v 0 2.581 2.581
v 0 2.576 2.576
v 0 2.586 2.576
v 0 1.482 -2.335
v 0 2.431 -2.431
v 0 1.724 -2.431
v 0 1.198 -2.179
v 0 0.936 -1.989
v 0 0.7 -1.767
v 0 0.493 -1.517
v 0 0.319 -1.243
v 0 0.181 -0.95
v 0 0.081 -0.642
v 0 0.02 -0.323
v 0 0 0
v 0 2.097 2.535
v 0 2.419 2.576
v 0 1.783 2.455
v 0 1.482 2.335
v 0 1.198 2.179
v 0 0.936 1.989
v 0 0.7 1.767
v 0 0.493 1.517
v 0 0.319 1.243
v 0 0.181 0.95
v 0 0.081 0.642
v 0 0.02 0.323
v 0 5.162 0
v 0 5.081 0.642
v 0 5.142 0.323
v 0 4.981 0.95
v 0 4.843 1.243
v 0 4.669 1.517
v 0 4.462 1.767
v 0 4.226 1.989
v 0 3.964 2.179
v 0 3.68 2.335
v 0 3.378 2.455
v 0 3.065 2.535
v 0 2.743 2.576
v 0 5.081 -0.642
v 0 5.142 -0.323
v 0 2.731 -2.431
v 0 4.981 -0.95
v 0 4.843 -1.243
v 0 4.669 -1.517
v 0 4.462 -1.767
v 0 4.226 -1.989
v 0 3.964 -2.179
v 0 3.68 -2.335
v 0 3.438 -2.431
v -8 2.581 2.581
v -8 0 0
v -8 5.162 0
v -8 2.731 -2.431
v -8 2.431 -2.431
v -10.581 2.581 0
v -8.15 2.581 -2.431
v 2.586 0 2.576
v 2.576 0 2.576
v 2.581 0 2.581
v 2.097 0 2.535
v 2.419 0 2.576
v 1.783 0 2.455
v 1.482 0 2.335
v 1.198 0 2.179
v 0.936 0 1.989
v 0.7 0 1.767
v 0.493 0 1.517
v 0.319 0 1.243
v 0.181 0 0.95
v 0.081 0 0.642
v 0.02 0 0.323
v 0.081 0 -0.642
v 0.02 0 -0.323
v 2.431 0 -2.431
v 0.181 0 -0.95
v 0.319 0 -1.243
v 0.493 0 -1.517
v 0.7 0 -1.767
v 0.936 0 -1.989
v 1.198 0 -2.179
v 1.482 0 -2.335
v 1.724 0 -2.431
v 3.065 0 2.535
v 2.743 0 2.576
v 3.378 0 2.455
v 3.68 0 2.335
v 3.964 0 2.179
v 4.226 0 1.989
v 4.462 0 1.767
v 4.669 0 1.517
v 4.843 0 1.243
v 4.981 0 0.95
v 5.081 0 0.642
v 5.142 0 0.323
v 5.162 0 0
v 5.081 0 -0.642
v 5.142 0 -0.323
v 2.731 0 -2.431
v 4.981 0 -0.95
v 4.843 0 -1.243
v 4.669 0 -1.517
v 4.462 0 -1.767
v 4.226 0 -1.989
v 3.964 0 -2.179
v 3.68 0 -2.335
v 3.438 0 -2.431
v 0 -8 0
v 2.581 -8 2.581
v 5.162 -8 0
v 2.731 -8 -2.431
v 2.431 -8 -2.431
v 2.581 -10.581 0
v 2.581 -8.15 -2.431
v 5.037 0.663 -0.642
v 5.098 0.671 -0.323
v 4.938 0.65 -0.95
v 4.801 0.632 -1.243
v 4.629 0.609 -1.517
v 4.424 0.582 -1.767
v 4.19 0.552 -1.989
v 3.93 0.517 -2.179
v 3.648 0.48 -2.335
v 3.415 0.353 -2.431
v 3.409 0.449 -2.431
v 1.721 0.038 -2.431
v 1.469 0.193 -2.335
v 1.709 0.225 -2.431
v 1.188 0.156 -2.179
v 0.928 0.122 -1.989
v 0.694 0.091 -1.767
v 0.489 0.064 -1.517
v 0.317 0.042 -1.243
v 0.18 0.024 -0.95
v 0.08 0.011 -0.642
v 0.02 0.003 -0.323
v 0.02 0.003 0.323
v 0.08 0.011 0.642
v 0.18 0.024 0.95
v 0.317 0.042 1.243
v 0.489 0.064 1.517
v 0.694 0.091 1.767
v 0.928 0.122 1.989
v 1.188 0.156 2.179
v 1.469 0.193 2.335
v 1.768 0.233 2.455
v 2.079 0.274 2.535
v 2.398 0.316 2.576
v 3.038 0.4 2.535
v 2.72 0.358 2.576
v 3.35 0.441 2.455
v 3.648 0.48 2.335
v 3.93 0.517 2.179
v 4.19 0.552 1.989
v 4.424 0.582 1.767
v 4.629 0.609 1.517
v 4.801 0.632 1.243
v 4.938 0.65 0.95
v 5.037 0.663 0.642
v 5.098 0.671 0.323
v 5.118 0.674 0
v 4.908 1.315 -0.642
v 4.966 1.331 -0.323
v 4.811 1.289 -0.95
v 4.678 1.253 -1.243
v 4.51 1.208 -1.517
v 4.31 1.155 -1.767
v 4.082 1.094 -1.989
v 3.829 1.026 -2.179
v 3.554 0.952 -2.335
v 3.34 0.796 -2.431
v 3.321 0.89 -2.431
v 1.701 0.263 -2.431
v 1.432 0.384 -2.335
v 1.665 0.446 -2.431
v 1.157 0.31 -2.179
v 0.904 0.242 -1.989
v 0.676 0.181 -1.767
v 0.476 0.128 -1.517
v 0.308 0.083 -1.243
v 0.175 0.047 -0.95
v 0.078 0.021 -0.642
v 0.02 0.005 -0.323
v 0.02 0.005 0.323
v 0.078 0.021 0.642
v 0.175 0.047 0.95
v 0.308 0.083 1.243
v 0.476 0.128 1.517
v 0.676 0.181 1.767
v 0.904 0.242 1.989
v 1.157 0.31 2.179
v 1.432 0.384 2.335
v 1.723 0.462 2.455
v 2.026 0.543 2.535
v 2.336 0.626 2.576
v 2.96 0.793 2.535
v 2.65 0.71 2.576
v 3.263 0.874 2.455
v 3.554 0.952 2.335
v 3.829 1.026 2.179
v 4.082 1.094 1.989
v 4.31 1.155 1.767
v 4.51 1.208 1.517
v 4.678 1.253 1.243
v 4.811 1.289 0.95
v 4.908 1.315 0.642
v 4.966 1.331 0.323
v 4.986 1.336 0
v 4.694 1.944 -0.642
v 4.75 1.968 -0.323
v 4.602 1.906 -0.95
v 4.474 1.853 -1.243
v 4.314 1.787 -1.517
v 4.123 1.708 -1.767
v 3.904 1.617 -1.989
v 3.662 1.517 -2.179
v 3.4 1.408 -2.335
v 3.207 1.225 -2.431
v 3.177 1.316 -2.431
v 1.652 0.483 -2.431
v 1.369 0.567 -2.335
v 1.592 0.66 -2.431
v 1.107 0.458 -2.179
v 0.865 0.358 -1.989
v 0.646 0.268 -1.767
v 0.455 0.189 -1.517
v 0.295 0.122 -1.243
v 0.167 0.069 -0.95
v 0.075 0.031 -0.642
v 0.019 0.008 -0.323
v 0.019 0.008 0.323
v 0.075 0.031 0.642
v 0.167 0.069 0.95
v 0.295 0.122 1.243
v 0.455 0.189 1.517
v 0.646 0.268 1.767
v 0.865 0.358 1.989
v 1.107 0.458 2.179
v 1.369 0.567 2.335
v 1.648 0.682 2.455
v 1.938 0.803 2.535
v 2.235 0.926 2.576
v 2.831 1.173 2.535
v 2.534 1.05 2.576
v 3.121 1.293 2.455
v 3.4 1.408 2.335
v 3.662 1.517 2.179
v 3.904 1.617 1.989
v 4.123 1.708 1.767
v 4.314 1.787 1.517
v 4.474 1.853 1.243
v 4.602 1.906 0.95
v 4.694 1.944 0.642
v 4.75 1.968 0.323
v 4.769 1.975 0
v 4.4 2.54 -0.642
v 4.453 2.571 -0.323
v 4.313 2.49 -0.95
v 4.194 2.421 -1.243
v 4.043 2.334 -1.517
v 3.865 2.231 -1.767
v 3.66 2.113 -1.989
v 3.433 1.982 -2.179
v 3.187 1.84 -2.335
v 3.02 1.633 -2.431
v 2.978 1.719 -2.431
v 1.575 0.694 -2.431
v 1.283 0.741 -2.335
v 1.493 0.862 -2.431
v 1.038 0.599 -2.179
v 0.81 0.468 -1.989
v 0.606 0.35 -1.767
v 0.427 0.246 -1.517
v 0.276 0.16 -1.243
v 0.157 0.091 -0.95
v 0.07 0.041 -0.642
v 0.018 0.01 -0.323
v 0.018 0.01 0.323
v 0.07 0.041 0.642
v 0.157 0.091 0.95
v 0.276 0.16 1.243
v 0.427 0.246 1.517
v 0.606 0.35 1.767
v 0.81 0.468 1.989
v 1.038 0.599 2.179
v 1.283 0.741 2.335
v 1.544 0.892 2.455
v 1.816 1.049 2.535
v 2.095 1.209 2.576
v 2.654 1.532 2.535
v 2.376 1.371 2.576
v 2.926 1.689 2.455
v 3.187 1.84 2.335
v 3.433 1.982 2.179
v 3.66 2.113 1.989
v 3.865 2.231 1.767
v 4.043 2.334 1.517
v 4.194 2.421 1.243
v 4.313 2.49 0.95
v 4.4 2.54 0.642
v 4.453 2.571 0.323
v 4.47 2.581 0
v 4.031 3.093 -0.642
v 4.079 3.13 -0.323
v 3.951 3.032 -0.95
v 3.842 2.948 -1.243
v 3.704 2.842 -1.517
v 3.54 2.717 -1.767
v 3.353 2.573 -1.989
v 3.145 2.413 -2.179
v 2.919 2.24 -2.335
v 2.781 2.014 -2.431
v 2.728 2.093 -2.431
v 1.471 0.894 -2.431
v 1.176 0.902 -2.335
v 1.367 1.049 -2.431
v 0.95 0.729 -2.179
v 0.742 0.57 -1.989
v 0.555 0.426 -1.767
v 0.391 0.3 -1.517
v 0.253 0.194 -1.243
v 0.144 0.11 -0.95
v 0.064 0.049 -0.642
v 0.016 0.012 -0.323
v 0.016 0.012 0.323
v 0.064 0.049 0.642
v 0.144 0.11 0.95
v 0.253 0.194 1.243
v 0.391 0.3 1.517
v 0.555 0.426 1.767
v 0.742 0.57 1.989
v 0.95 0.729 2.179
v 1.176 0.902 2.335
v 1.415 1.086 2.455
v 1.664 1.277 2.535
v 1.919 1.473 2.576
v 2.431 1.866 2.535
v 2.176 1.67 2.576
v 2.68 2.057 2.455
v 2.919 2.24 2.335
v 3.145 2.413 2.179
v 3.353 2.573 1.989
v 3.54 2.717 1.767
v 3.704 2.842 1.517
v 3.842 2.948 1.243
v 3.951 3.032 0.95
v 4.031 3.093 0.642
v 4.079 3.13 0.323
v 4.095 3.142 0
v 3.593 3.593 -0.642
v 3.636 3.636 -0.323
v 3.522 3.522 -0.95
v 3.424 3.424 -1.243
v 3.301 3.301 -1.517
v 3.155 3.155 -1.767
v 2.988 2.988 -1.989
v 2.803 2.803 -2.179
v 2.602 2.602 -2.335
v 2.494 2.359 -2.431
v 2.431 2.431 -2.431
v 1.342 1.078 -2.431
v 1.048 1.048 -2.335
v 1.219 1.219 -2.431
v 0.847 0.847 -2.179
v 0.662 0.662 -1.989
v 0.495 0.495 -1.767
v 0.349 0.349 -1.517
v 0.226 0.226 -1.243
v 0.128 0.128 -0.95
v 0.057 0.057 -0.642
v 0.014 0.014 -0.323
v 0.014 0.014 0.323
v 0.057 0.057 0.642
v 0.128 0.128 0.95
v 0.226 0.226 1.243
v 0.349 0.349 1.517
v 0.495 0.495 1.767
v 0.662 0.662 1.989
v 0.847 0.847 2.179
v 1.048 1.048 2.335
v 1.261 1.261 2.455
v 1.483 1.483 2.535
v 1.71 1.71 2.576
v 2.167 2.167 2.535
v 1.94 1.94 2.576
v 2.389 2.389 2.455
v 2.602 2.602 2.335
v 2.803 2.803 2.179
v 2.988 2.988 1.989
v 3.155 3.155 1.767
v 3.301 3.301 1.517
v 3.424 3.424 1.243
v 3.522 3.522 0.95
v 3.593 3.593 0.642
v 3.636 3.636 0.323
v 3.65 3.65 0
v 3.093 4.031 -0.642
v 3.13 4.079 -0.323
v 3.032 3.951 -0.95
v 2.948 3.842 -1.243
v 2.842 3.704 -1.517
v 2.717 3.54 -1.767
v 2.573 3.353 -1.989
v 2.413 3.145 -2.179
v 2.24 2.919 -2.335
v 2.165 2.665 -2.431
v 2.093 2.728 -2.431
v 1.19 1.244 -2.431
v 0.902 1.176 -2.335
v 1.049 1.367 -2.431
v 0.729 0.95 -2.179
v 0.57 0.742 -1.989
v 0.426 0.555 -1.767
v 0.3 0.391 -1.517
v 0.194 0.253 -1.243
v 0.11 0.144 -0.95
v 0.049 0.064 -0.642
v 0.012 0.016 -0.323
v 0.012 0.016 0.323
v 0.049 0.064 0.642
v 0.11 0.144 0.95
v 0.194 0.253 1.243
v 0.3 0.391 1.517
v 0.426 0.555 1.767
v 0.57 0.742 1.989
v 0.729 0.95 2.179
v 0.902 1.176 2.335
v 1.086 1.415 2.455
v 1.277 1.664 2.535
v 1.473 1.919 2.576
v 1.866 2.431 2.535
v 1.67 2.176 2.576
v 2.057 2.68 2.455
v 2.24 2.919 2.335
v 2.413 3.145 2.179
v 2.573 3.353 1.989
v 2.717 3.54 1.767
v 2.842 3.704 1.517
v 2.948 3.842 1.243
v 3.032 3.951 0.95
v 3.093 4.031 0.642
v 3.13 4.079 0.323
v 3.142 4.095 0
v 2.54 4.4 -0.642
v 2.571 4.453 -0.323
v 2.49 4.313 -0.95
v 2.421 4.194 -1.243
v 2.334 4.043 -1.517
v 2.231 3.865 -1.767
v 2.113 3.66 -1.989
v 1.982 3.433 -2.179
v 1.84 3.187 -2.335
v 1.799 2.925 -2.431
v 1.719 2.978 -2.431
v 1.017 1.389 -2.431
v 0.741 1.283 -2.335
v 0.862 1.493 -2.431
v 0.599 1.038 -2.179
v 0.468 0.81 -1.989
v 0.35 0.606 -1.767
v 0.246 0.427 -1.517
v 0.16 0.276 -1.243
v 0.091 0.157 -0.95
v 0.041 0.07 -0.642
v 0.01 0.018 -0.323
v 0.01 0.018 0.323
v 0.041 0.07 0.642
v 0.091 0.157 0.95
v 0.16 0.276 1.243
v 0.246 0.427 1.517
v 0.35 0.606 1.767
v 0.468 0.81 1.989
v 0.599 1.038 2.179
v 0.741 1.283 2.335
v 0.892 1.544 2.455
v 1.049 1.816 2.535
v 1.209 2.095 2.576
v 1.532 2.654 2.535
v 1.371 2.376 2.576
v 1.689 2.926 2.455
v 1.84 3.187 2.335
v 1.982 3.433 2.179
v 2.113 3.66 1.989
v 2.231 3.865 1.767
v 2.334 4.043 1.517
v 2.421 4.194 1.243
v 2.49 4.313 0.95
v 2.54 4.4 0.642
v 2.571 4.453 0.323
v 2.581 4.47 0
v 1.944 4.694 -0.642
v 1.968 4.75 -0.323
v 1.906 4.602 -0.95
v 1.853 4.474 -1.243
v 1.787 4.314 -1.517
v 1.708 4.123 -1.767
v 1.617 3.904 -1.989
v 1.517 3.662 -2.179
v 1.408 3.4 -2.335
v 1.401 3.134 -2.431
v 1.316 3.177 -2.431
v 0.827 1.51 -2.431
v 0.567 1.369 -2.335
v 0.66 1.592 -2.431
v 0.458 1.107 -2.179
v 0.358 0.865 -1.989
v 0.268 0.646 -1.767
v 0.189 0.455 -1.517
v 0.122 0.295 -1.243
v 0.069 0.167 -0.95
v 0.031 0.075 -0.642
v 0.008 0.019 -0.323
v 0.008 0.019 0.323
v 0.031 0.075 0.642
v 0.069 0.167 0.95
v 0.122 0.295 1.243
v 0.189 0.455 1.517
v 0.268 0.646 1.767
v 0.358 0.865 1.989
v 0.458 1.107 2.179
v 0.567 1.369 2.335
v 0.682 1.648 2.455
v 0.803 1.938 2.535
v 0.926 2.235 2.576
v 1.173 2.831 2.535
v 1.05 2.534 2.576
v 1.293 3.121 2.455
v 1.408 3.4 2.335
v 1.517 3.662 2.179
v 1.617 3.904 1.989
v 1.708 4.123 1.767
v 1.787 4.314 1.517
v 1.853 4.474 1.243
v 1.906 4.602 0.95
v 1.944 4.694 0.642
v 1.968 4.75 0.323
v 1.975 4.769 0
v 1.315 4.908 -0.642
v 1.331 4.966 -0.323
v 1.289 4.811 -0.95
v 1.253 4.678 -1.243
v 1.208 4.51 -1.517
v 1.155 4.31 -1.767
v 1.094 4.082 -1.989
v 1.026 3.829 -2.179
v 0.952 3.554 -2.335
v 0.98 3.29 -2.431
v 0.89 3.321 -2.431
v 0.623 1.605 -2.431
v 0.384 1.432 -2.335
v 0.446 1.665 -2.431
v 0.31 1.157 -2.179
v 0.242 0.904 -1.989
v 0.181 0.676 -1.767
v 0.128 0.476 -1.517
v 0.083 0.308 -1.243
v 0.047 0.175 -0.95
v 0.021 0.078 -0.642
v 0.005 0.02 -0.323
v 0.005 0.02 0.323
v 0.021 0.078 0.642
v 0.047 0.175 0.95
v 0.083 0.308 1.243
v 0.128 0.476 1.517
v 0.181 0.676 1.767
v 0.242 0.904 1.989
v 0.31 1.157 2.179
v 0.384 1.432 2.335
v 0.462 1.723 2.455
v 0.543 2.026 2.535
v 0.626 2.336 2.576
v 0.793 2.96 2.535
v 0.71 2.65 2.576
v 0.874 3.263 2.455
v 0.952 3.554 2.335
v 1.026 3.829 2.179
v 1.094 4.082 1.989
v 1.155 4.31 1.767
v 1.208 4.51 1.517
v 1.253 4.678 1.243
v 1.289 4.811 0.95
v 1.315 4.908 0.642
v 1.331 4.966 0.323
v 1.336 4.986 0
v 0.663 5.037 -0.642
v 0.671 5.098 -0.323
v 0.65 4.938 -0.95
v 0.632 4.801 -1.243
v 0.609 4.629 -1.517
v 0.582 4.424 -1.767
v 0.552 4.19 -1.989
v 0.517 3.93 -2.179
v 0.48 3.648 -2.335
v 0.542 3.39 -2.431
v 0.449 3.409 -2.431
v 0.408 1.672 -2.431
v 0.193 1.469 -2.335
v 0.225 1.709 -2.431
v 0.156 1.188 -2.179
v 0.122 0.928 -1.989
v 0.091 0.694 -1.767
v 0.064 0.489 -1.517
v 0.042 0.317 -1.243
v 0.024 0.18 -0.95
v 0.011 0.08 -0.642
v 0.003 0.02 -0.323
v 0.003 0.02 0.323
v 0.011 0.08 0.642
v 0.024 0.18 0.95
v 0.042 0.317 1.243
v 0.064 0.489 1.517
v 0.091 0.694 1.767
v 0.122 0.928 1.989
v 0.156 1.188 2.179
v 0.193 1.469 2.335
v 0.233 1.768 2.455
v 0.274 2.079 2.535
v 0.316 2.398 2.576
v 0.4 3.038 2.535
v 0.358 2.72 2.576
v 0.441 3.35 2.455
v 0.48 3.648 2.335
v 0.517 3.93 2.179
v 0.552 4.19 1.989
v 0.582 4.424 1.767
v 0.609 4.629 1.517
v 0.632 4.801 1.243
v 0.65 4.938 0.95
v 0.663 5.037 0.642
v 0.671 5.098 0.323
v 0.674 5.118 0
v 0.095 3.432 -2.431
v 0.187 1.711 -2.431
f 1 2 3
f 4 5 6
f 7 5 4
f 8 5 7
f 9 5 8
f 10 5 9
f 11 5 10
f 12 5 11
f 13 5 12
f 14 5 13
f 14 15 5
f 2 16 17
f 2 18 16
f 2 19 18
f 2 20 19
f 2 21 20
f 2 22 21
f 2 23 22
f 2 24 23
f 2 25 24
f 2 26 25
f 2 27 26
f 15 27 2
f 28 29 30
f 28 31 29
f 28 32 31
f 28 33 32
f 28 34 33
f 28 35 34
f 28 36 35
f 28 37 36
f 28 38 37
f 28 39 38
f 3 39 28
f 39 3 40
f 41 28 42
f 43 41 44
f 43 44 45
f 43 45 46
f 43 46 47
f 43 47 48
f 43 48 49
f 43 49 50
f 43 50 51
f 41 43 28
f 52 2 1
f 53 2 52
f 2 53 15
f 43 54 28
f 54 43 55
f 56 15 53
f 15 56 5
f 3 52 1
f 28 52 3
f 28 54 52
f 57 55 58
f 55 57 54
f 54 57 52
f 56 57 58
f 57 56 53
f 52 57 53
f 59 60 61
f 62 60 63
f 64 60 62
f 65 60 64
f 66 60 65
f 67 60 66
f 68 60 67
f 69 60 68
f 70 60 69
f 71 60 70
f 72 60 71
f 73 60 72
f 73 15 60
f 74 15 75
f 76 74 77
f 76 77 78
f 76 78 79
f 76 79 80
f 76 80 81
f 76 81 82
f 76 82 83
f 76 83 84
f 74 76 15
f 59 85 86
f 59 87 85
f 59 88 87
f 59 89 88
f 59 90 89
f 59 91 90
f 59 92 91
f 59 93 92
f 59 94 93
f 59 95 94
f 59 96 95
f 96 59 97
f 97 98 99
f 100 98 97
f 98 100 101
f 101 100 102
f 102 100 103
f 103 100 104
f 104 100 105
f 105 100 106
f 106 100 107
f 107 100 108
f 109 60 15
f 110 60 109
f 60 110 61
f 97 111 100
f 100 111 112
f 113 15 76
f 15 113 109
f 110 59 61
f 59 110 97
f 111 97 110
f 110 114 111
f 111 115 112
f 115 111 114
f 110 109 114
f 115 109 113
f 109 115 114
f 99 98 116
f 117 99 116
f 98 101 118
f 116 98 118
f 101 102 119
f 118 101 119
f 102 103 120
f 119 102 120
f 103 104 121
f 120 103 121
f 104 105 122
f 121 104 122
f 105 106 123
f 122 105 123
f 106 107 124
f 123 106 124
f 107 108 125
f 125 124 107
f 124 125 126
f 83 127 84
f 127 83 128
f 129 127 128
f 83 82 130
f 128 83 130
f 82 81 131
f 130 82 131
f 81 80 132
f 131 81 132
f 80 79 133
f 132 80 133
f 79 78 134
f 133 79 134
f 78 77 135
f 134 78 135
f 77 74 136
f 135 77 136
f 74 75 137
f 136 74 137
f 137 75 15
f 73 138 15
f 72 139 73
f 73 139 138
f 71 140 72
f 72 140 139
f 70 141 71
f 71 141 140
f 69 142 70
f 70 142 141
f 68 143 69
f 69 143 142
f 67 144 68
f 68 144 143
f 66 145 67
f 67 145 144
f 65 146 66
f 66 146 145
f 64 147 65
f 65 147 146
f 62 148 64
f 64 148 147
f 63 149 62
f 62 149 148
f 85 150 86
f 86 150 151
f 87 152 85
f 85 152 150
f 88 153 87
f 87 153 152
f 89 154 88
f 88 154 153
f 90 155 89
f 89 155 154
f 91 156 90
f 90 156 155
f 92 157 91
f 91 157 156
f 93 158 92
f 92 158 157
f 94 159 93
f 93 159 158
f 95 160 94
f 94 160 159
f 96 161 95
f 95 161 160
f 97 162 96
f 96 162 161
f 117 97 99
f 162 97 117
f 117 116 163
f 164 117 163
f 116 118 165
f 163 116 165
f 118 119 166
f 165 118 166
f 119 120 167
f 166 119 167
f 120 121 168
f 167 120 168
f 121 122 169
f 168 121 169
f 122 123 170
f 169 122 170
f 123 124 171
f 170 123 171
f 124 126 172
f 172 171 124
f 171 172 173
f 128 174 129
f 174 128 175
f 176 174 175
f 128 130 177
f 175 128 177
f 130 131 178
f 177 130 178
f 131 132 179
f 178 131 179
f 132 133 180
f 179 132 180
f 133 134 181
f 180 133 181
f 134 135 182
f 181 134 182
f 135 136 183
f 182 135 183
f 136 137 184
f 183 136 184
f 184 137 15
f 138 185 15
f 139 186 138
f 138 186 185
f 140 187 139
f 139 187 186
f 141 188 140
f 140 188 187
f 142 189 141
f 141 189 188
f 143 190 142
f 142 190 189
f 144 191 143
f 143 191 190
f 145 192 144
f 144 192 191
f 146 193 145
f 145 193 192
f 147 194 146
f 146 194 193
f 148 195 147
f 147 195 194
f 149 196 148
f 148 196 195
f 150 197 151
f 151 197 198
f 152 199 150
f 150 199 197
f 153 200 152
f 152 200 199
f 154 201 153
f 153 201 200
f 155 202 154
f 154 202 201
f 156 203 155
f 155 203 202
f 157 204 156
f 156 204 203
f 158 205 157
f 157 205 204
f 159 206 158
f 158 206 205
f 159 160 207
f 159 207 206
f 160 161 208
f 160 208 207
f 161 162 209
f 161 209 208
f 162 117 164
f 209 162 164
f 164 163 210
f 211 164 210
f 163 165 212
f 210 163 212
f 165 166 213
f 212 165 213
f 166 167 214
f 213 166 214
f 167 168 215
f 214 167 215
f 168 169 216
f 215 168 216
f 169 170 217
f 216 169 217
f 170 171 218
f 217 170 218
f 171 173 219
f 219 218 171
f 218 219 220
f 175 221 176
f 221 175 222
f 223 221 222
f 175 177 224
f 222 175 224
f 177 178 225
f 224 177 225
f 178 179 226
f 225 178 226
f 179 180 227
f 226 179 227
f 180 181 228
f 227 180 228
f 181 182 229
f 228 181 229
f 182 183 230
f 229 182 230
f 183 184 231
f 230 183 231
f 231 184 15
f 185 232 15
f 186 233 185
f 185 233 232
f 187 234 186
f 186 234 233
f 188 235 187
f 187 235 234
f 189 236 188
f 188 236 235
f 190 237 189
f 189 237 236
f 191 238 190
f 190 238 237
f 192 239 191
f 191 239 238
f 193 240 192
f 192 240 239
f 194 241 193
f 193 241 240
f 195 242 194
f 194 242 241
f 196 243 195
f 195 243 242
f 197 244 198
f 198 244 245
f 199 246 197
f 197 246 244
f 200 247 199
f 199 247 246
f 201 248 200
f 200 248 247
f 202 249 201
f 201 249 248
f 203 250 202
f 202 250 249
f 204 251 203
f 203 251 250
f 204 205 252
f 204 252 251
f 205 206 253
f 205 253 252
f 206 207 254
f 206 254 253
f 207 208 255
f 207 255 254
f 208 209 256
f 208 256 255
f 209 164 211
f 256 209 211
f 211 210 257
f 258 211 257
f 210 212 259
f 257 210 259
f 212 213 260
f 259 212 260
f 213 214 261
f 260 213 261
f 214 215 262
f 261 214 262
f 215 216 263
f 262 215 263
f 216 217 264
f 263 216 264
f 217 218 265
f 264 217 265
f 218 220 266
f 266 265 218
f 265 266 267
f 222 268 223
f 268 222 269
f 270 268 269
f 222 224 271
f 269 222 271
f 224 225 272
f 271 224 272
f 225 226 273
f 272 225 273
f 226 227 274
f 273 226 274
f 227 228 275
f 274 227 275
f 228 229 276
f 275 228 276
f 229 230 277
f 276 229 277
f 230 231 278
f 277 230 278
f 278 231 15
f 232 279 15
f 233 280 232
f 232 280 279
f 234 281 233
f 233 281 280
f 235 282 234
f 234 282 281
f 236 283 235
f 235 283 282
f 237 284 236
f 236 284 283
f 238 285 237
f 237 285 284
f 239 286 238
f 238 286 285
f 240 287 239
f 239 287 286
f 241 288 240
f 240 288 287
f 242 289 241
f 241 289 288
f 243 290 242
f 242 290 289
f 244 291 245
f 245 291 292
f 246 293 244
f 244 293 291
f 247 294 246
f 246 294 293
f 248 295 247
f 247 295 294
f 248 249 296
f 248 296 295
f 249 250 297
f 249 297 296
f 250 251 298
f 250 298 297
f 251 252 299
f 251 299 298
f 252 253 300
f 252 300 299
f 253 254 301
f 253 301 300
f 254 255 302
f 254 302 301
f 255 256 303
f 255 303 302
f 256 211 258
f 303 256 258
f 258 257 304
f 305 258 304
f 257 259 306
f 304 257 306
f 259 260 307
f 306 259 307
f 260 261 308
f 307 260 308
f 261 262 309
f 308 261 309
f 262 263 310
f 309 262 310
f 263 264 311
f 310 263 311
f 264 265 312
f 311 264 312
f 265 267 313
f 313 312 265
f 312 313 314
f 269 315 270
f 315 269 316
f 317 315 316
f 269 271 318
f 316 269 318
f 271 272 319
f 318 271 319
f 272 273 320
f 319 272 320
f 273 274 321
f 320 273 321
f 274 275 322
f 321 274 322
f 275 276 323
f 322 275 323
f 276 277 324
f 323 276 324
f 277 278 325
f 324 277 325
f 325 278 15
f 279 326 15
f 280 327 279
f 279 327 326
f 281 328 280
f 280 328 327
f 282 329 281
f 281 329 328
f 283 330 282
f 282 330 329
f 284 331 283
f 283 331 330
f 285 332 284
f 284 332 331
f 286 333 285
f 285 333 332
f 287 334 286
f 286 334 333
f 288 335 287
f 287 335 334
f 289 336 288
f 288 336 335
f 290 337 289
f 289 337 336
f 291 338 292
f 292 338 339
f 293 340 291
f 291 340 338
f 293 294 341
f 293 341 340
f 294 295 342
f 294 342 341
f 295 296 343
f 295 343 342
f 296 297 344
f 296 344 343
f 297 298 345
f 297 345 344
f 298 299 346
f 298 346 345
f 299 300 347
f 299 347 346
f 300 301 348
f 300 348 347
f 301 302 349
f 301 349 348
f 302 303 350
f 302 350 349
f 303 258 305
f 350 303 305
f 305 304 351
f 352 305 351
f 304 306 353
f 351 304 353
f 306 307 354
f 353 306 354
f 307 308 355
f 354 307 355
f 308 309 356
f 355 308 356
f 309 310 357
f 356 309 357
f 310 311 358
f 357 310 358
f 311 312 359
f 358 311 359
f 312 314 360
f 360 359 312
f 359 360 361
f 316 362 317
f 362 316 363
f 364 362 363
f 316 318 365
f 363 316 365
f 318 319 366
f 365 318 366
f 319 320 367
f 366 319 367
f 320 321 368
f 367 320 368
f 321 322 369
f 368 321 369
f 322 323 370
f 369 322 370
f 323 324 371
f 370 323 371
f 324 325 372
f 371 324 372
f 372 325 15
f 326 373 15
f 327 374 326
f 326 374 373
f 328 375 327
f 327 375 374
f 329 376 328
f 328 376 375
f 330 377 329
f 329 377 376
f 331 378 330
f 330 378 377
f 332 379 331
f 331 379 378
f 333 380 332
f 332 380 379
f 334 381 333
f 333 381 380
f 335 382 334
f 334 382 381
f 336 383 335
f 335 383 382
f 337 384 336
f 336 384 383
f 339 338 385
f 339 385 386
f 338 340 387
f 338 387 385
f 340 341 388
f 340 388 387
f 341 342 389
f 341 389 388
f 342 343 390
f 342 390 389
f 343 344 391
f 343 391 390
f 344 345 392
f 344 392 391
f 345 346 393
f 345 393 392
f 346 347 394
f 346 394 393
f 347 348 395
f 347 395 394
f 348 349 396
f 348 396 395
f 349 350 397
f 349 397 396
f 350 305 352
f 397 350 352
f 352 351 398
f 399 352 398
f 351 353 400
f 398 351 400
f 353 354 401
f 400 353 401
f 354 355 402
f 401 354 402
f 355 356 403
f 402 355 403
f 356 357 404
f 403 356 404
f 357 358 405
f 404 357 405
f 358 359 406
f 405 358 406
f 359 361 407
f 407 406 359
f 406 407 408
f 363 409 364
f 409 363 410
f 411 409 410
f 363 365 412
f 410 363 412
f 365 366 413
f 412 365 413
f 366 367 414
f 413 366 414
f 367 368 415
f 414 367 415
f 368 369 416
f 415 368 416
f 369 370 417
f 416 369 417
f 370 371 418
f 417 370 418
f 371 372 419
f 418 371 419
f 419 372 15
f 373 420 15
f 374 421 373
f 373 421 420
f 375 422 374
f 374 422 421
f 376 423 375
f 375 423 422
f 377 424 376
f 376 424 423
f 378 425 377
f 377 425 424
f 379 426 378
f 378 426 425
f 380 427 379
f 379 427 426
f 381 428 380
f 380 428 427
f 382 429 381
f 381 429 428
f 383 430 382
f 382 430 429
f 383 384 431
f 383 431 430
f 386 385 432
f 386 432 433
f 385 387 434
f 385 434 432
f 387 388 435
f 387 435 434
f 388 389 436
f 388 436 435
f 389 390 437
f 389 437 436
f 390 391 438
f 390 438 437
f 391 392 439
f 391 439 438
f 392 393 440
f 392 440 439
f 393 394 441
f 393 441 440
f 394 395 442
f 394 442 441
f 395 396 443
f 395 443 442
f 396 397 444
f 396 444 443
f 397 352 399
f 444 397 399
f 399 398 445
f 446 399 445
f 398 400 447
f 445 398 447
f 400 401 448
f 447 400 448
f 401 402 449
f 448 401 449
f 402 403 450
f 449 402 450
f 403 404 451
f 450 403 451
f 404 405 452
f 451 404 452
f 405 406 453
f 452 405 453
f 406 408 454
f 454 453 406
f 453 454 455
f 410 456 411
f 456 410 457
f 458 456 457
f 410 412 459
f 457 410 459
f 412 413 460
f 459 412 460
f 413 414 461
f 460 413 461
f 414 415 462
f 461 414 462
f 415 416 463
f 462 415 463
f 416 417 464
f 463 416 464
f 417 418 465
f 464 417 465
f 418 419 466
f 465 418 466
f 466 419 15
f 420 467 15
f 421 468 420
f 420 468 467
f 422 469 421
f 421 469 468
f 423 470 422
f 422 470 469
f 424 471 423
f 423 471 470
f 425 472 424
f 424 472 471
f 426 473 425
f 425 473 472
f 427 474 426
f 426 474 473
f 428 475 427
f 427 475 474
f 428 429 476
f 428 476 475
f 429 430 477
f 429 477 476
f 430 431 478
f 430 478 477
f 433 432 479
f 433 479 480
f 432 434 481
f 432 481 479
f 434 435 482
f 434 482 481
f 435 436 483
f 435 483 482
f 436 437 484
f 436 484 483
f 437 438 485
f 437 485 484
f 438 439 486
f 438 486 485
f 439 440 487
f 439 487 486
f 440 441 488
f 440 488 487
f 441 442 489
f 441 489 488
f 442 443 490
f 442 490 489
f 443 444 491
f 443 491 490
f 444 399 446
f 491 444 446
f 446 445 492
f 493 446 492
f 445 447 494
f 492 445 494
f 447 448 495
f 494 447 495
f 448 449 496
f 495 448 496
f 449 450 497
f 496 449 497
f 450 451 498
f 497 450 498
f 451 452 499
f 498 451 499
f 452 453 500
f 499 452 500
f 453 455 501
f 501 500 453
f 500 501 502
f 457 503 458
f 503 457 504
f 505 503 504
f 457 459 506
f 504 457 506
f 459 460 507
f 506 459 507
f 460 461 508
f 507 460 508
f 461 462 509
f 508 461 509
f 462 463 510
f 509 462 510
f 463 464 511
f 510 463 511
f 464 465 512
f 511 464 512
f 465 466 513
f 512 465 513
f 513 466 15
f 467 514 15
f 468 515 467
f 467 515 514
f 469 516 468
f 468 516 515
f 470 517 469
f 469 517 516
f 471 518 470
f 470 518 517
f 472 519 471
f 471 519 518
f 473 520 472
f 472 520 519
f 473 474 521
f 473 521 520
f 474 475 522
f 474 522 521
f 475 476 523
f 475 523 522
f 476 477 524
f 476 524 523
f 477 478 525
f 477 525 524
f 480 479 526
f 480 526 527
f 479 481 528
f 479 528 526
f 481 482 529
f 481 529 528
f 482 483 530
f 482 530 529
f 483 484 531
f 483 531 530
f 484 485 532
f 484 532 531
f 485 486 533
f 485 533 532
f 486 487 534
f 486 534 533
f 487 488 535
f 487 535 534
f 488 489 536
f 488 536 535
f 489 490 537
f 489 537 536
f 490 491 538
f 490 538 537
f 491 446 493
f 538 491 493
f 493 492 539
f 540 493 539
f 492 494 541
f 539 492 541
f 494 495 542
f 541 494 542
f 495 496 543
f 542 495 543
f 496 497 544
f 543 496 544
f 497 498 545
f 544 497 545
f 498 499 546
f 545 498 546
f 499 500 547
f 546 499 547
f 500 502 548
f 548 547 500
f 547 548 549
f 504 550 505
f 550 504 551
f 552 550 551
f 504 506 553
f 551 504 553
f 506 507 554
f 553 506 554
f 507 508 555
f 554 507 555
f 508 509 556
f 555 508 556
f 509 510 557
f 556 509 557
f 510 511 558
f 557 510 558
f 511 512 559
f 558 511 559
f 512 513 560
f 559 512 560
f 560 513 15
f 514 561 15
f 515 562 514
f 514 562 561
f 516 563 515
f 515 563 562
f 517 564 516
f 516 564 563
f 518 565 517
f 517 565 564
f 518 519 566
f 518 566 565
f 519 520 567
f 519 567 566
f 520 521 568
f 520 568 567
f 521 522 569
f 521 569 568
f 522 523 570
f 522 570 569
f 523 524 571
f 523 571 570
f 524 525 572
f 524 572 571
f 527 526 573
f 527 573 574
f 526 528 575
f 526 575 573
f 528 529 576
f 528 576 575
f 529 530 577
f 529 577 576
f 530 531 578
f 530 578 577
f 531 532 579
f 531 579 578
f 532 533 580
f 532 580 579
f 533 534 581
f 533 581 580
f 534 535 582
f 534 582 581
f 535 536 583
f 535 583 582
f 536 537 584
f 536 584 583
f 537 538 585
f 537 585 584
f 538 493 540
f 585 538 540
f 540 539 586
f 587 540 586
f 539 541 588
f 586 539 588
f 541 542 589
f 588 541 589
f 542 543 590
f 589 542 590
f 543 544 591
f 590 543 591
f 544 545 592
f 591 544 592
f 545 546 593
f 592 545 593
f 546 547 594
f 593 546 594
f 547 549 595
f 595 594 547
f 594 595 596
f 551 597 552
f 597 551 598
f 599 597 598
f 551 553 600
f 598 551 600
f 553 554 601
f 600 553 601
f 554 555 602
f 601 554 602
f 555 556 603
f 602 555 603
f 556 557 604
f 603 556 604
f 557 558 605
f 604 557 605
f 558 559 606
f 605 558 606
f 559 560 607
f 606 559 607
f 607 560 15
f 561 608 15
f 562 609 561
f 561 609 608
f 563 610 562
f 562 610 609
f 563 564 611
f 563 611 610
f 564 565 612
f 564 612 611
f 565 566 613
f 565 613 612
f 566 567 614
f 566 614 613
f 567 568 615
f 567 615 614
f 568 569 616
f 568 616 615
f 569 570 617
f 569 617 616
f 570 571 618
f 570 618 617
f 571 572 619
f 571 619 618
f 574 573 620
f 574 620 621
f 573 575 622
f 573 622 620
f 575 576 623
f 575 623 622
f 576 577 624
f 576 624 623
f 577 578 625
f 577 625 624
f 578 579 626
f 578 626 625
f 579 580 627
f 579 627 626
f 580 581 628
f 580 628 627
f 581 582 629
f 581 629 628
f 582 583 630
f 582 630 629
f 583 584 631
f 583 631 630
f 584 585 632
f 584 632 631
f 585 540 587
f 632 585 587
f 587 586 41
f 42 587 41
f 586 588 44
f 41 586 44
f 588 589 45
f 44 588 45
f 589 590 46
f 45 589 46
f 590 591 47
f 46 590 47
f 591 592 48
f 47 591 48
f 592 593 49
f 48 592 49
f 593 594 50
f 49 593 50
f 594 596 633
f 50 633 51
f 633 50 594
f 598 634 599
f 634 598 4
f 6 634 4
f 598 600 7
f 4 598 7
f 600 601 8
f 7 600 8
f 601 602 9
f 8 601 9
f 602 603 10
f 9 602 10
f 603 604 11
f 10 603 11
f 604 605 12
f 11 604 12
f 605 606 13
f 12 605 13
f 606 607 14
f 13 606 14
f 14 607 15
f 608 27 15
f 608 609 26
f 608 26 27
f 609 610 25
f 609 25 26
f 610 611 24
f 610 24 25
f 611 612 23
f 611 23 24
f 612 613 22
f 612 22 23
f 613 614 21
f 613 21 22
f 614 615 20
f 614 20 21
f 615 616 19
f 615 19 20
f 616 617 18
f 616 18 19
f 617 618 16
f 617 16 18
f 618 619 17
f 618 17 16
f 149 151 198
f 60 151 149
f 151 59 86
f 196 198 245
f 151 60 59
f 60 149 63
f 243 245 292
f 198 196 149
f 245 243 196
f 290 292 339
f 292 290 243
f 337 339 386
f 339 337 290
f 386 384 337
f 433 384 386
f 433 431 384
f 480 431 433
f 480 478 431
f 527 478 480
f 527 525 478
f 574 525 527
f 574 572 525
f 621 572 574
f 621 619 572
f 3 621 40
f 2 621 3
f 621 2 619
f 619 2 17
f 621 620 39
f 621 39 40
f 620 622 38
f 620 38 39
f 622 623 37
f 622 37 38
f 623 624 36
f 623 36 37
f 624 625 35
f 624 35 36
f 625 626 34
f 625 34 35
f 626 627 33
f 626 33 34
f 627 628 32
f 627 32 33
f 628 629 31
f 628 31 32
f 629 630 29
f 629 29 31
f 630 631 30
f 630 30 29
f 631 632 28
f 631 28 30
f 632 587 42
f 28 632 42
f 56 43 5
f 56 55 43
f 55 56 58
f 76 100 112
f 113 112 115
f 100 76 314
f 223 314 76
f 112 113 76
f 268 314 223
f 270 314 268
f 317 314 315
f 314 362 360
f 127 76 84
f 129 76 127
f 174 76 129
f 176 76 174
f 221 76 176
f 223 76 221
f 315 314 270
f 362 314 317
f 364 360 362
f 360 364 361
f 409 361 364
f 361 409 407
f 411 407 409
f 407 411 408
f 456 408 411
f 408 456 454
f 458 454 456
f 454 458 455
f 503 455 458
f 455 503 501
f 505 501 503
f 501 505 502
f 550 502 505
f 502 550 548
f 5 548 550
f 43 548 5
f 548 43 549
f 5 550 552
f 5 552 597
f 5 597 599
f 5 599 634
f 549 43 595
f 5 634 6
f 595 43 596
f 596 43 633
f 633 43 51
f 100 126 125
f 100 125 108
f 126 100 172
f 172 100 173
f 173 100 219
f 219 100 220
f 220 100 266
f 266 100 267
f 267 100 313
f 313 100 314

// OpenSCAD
// file: funciones.scad
   
module translate_giro(d, angulo) {
    translate([-d * cos(180-angulo), d * sin(180-angulo), 0])
        rotate(angulo)
            children();
}

module raise(z) {
    translate([0, 0, z]) children();
}

module semiesfera(di) {
    intersection() {
        sphere(d=di);
        translate([di/4, 0]) cube([di/2, di, di], true);
    }
}


module semiesfera_redondeada(diametro, diametro_redondeo = 0) {
    diametro_redondeo = diametro_redondeo == 0 ? diametro / 4 : diametro_redondeo;
    
    diametro2 = diametro / 2;
    diametro_redondeo2 = diametro_redondeo / 2;
    ddr2 = diametro2 - diametro_redondeo2;
    
    union () {
        translate([diametro_redondeo2, 0, 0]) resize([ddr2, diametro, diametro]) semiesfera(diametro);
        
        intersection() {
            translate([diametro_redondeo2, 0, 0]) rotate([0, 90]) toro(diametro, diametro_redondeo);
            translate([diametro_redondeo2 /2, 0, 0]) cube([diametro_redondeo2, diametro, diametro], true);
        }
        
        rotate([0, 90]) cylinder(diametro_redondeo2, d=diametro - diametro_redondeo);
    }
}

module cuartoesfera(di) {
    intersection() {
        sphere(d=di);
        translate([di/4, di/4]) cube([di/2, di/2, di], true);
    }
}

module cuartoesfera_aplastada(di, ancho, x = true) {
    if (x)
        resize([ancho/2, di/2, di]) cuartoesfera(di);
    else
        rotate(90) resize([di/2, ancho/2, di]) cuartoesfera(di);
}

module semicircle(diametro) {
    intersection() {
        circle(d=diametro);
        translate([diametro/4, 0]) square([diametro/2, diametro], true);
    }
}

module semicircle_redondeado(diametro, diametro_redondeo = 0) {
    diametro_redondeo = diametro_redondeo == 0 ? diametro / 4 : diametro_redondeo;
    
    translate([diametro_redondeo/2, 0]) resize([diametro/2 - diametro_redondeo/2, diametro]) semicircle(diametro);
    translate([diametro_redondeo/2, diametro/2 - diametro_redondeo/2]) rotate(90) cuartocircle(diametro_redondeo);
    translate([diametro_redondeo/2, -(diametro/2 - diametro_redondeo/2)]) rotate(180) cuartocircle(diametro_redondeo);
    translate([diametro_redondeo/4, 0]) square([diametro_redondeo/2, diametro - diametro_redondeo], true);
}

module cuartocircle(diametro) {
    intersection() {
        circle(d=diametro);
        translate([diametro/4, diametro/4]) square([diametro/2, diametro/2], true);
    }
}

module talla_cuartocircle(radio) {
    difference() {
        square(radio);
        circle(radio);
    }
}

module semicylinder(altura, diametro) {
    intersection() {
        cylinder(altura, d=diametro);
        translate([0, -diametro/2, 0]) cube([diametro/2, diametro, altura]);
    }
}

module semicylinder_hueco(altura, diametro, grosor) {
    // Queda feo en la previsualizacion
    //
    // difference() {
    //     semicylinder(altura, diametro);
    //     semicylinder(altura, diametro-grosor);
    // }
    
    rotate(-90) rotate_extrude(angle=180) translate([diametro/2 - grosor, 0]) square([grosor, altura]);
}

module cuartocylinder_hueco(altura, diametro, grosor) {
    rotate(0) rotate_extrude(angle=90) translate([diametro/2 - grosor, 0]) square([grosor, altura]);
}

module cylinder_hueco(altura, diametro, grosor) {
    rotate_extrude(angle=360) translate([diametro/2 - grosor, 0]) square([grosor, altura]);
}

module toro_parcial(diametro_grande, diametro_pequeno, angulo) {
    rotate_extrude(angle=angulo)
        translate([diametro_grande / 2 - diametro_pequeno / 2, 0])
            circle(d=diametro_pequeno);
}

function radio_horizontal(radio, altura_desde_arriba) = radio*sin(acos((radio-altura_desde_arriba)/radio));

module toro(diametro_grande, diametro_pequeno) {
    rotate_extrude()
        translate([diametro_grande/2 - diametro_pequeno / 2, 0])
            circle(d=diametro_pequeno);
}

module talla_semicilindro(ancho, largo) {
    difference() {
        cube([ancho/2, largo, ancho], true);
        translate([-ancho/4, largo/2, 0]) rotate([90, 0]) cylinder(largo, d=ancho);
    }
}

module talla_cuartocirculo(ancho, largo) {
    difference() {
        cube([ancho, largo, ancho], true);
        translate([-ancho/2, largo/2, -ancho/2]) rotate([90, 0]) cylinder(largo, d=ancho*2);
    }
}

module sector_circular(diametro, angulo) {
    angulo2 = angulo / 2;
    
    if (0 == angulo) {
        // Nothing
    } else if (360 <= angulo) {
        circle(d = diametro);
    } else if (180 <= angulo) {
        union () {
            difference() {
                circle(d = diametro);
                color("red") rotate(angulo2) translate([0, diametro/4]) square([diametro, diametro/2], true);
            }
            
            difference() {
                circle(d = diametro);
                color("purple") rotate(360-angulo2) translate([0, -diametro/4]) square([diametro, diametro/2], true);
            }
        }
    } else {
        difference() {
            circle(d = diametro);
            color("red") rotate(angulo2) translate([0, diametro/4]) square([diametro, diametro/2], true);
            color("purple") rotate(360-angulo2) translate([0, -diametro/4]) square([diametro, diametro/2], true);
        }
    }
}

module talla_semicirculo(diametro, rotacion = 0, sobresaliente = 0) {
    rotate(rotacion) 
        difference() {
            square([diametro / 2 + sobresaliente * 2, diametro + sobresaliente], true);
            translate([-diametro / 4, 0]) circle(d = diametro);
            translate([-sobresaliente/2 -diametro/4 - 0.5, 0]) square([sobresaliente + 1, diametro], true);
        }
}

module arco_redondeado(diametro, grosor, angulo, bolas_en_exterior = true) {
    diametro2         = diametro / 2;
    grosor2           = grosor / 2;
    diametro_medio    = diametro2 - grosor2;
    diametro_interior = diametro - 2 * grosor;
    alpha             = asin(grosor2 / diametro_medio);
    angulo            = bolas_en_exterior ? angulo : angulo - 2 * alpha;
    angulo2           = angulo / 2;
    
    union() {
        difference() {
            sector_circular(diametro, angulo);
            sector_circular(diametro_interior, angulo + 10);
        }
        
        color("red") translate_giro(diametro_medio, angulo2)  circle(d=grosor);
        color("red") translate_giro(diametro_medio, -angulo2) circle(d=grosor);
    }
}
// main file
use <funciones.scad>

$fn = 50;

diametro      = 4.8;
largo_inserto = 8;
trim          = 0.15;
angulo        = 90;

/// 

PI             = 3.14159;
alto           = diametro;
ancho          = diametro + 3;
lado_inserto   = diametro * PI / 4; // sqrt(diametro * diametro / 2);
diametro2      = diametro / 2;
largo_inserto2 = largo_inserto / 2;

dt = (ancho-diametro)/2;

/*
difference() {
    cube([ancho, ancho, alto], true);
    color("red") translate([0  * ancho, -dt - 0.2]) cylinder(1 + alto, d=diametro, center=true);
    color("red") translate([0, 6]) cube([1 + ancho * 5, ancho, 1 + alto], true);
}*/


lado_inserto = 3.65;
diagonal_inserto  = sqrt(2 * lado_inserto * lado_inserto);
diagonal_inserto2 = diagonal_inserto / 2;
diagonal_inserto4 = diagonal_inserto / 4;
lado_inserto2     = lado_inserto / 2;

difference() {
    union() {
        translate([-largo_inserto2 , diagonal_inserto2, 0]) inserto("I");
        toro_parcial(2 * diagonal_inserto, diagonal_inserto, angulo);
        rotate(360 - angulo) translate([largo_inserto2, diagonal_inserto2, 0])  inserto("D");
    }
    raise(-diagonal_inserto2 + trim/2) cube([largo_inserto * 3, largo_inserto * 3, trim], true);
}

module inserto(pico = "") {
    rotate([45, 0, 0]) cube([largo_inserto, lado_inserto, lado_inserto], true);
    
    if (pico == "I") 
        translate([-diagonal_inserto4 - largo_inserto2, 0]) 
            rotate([0, 90]) 
                cylinder(diagonal_inserto2, r1=0, r2=diagonal_inserto2, $fn=4, center = true);
    else if (pico == "D")
        translate([diagonal_inserto4 + largo_inserto2, 0]) 
            rotate([0, 270]) 
                cylinder(diagonal_inserto2, r1=0, r2=diagonal_inserto2, $fn=4, center = true);
}
